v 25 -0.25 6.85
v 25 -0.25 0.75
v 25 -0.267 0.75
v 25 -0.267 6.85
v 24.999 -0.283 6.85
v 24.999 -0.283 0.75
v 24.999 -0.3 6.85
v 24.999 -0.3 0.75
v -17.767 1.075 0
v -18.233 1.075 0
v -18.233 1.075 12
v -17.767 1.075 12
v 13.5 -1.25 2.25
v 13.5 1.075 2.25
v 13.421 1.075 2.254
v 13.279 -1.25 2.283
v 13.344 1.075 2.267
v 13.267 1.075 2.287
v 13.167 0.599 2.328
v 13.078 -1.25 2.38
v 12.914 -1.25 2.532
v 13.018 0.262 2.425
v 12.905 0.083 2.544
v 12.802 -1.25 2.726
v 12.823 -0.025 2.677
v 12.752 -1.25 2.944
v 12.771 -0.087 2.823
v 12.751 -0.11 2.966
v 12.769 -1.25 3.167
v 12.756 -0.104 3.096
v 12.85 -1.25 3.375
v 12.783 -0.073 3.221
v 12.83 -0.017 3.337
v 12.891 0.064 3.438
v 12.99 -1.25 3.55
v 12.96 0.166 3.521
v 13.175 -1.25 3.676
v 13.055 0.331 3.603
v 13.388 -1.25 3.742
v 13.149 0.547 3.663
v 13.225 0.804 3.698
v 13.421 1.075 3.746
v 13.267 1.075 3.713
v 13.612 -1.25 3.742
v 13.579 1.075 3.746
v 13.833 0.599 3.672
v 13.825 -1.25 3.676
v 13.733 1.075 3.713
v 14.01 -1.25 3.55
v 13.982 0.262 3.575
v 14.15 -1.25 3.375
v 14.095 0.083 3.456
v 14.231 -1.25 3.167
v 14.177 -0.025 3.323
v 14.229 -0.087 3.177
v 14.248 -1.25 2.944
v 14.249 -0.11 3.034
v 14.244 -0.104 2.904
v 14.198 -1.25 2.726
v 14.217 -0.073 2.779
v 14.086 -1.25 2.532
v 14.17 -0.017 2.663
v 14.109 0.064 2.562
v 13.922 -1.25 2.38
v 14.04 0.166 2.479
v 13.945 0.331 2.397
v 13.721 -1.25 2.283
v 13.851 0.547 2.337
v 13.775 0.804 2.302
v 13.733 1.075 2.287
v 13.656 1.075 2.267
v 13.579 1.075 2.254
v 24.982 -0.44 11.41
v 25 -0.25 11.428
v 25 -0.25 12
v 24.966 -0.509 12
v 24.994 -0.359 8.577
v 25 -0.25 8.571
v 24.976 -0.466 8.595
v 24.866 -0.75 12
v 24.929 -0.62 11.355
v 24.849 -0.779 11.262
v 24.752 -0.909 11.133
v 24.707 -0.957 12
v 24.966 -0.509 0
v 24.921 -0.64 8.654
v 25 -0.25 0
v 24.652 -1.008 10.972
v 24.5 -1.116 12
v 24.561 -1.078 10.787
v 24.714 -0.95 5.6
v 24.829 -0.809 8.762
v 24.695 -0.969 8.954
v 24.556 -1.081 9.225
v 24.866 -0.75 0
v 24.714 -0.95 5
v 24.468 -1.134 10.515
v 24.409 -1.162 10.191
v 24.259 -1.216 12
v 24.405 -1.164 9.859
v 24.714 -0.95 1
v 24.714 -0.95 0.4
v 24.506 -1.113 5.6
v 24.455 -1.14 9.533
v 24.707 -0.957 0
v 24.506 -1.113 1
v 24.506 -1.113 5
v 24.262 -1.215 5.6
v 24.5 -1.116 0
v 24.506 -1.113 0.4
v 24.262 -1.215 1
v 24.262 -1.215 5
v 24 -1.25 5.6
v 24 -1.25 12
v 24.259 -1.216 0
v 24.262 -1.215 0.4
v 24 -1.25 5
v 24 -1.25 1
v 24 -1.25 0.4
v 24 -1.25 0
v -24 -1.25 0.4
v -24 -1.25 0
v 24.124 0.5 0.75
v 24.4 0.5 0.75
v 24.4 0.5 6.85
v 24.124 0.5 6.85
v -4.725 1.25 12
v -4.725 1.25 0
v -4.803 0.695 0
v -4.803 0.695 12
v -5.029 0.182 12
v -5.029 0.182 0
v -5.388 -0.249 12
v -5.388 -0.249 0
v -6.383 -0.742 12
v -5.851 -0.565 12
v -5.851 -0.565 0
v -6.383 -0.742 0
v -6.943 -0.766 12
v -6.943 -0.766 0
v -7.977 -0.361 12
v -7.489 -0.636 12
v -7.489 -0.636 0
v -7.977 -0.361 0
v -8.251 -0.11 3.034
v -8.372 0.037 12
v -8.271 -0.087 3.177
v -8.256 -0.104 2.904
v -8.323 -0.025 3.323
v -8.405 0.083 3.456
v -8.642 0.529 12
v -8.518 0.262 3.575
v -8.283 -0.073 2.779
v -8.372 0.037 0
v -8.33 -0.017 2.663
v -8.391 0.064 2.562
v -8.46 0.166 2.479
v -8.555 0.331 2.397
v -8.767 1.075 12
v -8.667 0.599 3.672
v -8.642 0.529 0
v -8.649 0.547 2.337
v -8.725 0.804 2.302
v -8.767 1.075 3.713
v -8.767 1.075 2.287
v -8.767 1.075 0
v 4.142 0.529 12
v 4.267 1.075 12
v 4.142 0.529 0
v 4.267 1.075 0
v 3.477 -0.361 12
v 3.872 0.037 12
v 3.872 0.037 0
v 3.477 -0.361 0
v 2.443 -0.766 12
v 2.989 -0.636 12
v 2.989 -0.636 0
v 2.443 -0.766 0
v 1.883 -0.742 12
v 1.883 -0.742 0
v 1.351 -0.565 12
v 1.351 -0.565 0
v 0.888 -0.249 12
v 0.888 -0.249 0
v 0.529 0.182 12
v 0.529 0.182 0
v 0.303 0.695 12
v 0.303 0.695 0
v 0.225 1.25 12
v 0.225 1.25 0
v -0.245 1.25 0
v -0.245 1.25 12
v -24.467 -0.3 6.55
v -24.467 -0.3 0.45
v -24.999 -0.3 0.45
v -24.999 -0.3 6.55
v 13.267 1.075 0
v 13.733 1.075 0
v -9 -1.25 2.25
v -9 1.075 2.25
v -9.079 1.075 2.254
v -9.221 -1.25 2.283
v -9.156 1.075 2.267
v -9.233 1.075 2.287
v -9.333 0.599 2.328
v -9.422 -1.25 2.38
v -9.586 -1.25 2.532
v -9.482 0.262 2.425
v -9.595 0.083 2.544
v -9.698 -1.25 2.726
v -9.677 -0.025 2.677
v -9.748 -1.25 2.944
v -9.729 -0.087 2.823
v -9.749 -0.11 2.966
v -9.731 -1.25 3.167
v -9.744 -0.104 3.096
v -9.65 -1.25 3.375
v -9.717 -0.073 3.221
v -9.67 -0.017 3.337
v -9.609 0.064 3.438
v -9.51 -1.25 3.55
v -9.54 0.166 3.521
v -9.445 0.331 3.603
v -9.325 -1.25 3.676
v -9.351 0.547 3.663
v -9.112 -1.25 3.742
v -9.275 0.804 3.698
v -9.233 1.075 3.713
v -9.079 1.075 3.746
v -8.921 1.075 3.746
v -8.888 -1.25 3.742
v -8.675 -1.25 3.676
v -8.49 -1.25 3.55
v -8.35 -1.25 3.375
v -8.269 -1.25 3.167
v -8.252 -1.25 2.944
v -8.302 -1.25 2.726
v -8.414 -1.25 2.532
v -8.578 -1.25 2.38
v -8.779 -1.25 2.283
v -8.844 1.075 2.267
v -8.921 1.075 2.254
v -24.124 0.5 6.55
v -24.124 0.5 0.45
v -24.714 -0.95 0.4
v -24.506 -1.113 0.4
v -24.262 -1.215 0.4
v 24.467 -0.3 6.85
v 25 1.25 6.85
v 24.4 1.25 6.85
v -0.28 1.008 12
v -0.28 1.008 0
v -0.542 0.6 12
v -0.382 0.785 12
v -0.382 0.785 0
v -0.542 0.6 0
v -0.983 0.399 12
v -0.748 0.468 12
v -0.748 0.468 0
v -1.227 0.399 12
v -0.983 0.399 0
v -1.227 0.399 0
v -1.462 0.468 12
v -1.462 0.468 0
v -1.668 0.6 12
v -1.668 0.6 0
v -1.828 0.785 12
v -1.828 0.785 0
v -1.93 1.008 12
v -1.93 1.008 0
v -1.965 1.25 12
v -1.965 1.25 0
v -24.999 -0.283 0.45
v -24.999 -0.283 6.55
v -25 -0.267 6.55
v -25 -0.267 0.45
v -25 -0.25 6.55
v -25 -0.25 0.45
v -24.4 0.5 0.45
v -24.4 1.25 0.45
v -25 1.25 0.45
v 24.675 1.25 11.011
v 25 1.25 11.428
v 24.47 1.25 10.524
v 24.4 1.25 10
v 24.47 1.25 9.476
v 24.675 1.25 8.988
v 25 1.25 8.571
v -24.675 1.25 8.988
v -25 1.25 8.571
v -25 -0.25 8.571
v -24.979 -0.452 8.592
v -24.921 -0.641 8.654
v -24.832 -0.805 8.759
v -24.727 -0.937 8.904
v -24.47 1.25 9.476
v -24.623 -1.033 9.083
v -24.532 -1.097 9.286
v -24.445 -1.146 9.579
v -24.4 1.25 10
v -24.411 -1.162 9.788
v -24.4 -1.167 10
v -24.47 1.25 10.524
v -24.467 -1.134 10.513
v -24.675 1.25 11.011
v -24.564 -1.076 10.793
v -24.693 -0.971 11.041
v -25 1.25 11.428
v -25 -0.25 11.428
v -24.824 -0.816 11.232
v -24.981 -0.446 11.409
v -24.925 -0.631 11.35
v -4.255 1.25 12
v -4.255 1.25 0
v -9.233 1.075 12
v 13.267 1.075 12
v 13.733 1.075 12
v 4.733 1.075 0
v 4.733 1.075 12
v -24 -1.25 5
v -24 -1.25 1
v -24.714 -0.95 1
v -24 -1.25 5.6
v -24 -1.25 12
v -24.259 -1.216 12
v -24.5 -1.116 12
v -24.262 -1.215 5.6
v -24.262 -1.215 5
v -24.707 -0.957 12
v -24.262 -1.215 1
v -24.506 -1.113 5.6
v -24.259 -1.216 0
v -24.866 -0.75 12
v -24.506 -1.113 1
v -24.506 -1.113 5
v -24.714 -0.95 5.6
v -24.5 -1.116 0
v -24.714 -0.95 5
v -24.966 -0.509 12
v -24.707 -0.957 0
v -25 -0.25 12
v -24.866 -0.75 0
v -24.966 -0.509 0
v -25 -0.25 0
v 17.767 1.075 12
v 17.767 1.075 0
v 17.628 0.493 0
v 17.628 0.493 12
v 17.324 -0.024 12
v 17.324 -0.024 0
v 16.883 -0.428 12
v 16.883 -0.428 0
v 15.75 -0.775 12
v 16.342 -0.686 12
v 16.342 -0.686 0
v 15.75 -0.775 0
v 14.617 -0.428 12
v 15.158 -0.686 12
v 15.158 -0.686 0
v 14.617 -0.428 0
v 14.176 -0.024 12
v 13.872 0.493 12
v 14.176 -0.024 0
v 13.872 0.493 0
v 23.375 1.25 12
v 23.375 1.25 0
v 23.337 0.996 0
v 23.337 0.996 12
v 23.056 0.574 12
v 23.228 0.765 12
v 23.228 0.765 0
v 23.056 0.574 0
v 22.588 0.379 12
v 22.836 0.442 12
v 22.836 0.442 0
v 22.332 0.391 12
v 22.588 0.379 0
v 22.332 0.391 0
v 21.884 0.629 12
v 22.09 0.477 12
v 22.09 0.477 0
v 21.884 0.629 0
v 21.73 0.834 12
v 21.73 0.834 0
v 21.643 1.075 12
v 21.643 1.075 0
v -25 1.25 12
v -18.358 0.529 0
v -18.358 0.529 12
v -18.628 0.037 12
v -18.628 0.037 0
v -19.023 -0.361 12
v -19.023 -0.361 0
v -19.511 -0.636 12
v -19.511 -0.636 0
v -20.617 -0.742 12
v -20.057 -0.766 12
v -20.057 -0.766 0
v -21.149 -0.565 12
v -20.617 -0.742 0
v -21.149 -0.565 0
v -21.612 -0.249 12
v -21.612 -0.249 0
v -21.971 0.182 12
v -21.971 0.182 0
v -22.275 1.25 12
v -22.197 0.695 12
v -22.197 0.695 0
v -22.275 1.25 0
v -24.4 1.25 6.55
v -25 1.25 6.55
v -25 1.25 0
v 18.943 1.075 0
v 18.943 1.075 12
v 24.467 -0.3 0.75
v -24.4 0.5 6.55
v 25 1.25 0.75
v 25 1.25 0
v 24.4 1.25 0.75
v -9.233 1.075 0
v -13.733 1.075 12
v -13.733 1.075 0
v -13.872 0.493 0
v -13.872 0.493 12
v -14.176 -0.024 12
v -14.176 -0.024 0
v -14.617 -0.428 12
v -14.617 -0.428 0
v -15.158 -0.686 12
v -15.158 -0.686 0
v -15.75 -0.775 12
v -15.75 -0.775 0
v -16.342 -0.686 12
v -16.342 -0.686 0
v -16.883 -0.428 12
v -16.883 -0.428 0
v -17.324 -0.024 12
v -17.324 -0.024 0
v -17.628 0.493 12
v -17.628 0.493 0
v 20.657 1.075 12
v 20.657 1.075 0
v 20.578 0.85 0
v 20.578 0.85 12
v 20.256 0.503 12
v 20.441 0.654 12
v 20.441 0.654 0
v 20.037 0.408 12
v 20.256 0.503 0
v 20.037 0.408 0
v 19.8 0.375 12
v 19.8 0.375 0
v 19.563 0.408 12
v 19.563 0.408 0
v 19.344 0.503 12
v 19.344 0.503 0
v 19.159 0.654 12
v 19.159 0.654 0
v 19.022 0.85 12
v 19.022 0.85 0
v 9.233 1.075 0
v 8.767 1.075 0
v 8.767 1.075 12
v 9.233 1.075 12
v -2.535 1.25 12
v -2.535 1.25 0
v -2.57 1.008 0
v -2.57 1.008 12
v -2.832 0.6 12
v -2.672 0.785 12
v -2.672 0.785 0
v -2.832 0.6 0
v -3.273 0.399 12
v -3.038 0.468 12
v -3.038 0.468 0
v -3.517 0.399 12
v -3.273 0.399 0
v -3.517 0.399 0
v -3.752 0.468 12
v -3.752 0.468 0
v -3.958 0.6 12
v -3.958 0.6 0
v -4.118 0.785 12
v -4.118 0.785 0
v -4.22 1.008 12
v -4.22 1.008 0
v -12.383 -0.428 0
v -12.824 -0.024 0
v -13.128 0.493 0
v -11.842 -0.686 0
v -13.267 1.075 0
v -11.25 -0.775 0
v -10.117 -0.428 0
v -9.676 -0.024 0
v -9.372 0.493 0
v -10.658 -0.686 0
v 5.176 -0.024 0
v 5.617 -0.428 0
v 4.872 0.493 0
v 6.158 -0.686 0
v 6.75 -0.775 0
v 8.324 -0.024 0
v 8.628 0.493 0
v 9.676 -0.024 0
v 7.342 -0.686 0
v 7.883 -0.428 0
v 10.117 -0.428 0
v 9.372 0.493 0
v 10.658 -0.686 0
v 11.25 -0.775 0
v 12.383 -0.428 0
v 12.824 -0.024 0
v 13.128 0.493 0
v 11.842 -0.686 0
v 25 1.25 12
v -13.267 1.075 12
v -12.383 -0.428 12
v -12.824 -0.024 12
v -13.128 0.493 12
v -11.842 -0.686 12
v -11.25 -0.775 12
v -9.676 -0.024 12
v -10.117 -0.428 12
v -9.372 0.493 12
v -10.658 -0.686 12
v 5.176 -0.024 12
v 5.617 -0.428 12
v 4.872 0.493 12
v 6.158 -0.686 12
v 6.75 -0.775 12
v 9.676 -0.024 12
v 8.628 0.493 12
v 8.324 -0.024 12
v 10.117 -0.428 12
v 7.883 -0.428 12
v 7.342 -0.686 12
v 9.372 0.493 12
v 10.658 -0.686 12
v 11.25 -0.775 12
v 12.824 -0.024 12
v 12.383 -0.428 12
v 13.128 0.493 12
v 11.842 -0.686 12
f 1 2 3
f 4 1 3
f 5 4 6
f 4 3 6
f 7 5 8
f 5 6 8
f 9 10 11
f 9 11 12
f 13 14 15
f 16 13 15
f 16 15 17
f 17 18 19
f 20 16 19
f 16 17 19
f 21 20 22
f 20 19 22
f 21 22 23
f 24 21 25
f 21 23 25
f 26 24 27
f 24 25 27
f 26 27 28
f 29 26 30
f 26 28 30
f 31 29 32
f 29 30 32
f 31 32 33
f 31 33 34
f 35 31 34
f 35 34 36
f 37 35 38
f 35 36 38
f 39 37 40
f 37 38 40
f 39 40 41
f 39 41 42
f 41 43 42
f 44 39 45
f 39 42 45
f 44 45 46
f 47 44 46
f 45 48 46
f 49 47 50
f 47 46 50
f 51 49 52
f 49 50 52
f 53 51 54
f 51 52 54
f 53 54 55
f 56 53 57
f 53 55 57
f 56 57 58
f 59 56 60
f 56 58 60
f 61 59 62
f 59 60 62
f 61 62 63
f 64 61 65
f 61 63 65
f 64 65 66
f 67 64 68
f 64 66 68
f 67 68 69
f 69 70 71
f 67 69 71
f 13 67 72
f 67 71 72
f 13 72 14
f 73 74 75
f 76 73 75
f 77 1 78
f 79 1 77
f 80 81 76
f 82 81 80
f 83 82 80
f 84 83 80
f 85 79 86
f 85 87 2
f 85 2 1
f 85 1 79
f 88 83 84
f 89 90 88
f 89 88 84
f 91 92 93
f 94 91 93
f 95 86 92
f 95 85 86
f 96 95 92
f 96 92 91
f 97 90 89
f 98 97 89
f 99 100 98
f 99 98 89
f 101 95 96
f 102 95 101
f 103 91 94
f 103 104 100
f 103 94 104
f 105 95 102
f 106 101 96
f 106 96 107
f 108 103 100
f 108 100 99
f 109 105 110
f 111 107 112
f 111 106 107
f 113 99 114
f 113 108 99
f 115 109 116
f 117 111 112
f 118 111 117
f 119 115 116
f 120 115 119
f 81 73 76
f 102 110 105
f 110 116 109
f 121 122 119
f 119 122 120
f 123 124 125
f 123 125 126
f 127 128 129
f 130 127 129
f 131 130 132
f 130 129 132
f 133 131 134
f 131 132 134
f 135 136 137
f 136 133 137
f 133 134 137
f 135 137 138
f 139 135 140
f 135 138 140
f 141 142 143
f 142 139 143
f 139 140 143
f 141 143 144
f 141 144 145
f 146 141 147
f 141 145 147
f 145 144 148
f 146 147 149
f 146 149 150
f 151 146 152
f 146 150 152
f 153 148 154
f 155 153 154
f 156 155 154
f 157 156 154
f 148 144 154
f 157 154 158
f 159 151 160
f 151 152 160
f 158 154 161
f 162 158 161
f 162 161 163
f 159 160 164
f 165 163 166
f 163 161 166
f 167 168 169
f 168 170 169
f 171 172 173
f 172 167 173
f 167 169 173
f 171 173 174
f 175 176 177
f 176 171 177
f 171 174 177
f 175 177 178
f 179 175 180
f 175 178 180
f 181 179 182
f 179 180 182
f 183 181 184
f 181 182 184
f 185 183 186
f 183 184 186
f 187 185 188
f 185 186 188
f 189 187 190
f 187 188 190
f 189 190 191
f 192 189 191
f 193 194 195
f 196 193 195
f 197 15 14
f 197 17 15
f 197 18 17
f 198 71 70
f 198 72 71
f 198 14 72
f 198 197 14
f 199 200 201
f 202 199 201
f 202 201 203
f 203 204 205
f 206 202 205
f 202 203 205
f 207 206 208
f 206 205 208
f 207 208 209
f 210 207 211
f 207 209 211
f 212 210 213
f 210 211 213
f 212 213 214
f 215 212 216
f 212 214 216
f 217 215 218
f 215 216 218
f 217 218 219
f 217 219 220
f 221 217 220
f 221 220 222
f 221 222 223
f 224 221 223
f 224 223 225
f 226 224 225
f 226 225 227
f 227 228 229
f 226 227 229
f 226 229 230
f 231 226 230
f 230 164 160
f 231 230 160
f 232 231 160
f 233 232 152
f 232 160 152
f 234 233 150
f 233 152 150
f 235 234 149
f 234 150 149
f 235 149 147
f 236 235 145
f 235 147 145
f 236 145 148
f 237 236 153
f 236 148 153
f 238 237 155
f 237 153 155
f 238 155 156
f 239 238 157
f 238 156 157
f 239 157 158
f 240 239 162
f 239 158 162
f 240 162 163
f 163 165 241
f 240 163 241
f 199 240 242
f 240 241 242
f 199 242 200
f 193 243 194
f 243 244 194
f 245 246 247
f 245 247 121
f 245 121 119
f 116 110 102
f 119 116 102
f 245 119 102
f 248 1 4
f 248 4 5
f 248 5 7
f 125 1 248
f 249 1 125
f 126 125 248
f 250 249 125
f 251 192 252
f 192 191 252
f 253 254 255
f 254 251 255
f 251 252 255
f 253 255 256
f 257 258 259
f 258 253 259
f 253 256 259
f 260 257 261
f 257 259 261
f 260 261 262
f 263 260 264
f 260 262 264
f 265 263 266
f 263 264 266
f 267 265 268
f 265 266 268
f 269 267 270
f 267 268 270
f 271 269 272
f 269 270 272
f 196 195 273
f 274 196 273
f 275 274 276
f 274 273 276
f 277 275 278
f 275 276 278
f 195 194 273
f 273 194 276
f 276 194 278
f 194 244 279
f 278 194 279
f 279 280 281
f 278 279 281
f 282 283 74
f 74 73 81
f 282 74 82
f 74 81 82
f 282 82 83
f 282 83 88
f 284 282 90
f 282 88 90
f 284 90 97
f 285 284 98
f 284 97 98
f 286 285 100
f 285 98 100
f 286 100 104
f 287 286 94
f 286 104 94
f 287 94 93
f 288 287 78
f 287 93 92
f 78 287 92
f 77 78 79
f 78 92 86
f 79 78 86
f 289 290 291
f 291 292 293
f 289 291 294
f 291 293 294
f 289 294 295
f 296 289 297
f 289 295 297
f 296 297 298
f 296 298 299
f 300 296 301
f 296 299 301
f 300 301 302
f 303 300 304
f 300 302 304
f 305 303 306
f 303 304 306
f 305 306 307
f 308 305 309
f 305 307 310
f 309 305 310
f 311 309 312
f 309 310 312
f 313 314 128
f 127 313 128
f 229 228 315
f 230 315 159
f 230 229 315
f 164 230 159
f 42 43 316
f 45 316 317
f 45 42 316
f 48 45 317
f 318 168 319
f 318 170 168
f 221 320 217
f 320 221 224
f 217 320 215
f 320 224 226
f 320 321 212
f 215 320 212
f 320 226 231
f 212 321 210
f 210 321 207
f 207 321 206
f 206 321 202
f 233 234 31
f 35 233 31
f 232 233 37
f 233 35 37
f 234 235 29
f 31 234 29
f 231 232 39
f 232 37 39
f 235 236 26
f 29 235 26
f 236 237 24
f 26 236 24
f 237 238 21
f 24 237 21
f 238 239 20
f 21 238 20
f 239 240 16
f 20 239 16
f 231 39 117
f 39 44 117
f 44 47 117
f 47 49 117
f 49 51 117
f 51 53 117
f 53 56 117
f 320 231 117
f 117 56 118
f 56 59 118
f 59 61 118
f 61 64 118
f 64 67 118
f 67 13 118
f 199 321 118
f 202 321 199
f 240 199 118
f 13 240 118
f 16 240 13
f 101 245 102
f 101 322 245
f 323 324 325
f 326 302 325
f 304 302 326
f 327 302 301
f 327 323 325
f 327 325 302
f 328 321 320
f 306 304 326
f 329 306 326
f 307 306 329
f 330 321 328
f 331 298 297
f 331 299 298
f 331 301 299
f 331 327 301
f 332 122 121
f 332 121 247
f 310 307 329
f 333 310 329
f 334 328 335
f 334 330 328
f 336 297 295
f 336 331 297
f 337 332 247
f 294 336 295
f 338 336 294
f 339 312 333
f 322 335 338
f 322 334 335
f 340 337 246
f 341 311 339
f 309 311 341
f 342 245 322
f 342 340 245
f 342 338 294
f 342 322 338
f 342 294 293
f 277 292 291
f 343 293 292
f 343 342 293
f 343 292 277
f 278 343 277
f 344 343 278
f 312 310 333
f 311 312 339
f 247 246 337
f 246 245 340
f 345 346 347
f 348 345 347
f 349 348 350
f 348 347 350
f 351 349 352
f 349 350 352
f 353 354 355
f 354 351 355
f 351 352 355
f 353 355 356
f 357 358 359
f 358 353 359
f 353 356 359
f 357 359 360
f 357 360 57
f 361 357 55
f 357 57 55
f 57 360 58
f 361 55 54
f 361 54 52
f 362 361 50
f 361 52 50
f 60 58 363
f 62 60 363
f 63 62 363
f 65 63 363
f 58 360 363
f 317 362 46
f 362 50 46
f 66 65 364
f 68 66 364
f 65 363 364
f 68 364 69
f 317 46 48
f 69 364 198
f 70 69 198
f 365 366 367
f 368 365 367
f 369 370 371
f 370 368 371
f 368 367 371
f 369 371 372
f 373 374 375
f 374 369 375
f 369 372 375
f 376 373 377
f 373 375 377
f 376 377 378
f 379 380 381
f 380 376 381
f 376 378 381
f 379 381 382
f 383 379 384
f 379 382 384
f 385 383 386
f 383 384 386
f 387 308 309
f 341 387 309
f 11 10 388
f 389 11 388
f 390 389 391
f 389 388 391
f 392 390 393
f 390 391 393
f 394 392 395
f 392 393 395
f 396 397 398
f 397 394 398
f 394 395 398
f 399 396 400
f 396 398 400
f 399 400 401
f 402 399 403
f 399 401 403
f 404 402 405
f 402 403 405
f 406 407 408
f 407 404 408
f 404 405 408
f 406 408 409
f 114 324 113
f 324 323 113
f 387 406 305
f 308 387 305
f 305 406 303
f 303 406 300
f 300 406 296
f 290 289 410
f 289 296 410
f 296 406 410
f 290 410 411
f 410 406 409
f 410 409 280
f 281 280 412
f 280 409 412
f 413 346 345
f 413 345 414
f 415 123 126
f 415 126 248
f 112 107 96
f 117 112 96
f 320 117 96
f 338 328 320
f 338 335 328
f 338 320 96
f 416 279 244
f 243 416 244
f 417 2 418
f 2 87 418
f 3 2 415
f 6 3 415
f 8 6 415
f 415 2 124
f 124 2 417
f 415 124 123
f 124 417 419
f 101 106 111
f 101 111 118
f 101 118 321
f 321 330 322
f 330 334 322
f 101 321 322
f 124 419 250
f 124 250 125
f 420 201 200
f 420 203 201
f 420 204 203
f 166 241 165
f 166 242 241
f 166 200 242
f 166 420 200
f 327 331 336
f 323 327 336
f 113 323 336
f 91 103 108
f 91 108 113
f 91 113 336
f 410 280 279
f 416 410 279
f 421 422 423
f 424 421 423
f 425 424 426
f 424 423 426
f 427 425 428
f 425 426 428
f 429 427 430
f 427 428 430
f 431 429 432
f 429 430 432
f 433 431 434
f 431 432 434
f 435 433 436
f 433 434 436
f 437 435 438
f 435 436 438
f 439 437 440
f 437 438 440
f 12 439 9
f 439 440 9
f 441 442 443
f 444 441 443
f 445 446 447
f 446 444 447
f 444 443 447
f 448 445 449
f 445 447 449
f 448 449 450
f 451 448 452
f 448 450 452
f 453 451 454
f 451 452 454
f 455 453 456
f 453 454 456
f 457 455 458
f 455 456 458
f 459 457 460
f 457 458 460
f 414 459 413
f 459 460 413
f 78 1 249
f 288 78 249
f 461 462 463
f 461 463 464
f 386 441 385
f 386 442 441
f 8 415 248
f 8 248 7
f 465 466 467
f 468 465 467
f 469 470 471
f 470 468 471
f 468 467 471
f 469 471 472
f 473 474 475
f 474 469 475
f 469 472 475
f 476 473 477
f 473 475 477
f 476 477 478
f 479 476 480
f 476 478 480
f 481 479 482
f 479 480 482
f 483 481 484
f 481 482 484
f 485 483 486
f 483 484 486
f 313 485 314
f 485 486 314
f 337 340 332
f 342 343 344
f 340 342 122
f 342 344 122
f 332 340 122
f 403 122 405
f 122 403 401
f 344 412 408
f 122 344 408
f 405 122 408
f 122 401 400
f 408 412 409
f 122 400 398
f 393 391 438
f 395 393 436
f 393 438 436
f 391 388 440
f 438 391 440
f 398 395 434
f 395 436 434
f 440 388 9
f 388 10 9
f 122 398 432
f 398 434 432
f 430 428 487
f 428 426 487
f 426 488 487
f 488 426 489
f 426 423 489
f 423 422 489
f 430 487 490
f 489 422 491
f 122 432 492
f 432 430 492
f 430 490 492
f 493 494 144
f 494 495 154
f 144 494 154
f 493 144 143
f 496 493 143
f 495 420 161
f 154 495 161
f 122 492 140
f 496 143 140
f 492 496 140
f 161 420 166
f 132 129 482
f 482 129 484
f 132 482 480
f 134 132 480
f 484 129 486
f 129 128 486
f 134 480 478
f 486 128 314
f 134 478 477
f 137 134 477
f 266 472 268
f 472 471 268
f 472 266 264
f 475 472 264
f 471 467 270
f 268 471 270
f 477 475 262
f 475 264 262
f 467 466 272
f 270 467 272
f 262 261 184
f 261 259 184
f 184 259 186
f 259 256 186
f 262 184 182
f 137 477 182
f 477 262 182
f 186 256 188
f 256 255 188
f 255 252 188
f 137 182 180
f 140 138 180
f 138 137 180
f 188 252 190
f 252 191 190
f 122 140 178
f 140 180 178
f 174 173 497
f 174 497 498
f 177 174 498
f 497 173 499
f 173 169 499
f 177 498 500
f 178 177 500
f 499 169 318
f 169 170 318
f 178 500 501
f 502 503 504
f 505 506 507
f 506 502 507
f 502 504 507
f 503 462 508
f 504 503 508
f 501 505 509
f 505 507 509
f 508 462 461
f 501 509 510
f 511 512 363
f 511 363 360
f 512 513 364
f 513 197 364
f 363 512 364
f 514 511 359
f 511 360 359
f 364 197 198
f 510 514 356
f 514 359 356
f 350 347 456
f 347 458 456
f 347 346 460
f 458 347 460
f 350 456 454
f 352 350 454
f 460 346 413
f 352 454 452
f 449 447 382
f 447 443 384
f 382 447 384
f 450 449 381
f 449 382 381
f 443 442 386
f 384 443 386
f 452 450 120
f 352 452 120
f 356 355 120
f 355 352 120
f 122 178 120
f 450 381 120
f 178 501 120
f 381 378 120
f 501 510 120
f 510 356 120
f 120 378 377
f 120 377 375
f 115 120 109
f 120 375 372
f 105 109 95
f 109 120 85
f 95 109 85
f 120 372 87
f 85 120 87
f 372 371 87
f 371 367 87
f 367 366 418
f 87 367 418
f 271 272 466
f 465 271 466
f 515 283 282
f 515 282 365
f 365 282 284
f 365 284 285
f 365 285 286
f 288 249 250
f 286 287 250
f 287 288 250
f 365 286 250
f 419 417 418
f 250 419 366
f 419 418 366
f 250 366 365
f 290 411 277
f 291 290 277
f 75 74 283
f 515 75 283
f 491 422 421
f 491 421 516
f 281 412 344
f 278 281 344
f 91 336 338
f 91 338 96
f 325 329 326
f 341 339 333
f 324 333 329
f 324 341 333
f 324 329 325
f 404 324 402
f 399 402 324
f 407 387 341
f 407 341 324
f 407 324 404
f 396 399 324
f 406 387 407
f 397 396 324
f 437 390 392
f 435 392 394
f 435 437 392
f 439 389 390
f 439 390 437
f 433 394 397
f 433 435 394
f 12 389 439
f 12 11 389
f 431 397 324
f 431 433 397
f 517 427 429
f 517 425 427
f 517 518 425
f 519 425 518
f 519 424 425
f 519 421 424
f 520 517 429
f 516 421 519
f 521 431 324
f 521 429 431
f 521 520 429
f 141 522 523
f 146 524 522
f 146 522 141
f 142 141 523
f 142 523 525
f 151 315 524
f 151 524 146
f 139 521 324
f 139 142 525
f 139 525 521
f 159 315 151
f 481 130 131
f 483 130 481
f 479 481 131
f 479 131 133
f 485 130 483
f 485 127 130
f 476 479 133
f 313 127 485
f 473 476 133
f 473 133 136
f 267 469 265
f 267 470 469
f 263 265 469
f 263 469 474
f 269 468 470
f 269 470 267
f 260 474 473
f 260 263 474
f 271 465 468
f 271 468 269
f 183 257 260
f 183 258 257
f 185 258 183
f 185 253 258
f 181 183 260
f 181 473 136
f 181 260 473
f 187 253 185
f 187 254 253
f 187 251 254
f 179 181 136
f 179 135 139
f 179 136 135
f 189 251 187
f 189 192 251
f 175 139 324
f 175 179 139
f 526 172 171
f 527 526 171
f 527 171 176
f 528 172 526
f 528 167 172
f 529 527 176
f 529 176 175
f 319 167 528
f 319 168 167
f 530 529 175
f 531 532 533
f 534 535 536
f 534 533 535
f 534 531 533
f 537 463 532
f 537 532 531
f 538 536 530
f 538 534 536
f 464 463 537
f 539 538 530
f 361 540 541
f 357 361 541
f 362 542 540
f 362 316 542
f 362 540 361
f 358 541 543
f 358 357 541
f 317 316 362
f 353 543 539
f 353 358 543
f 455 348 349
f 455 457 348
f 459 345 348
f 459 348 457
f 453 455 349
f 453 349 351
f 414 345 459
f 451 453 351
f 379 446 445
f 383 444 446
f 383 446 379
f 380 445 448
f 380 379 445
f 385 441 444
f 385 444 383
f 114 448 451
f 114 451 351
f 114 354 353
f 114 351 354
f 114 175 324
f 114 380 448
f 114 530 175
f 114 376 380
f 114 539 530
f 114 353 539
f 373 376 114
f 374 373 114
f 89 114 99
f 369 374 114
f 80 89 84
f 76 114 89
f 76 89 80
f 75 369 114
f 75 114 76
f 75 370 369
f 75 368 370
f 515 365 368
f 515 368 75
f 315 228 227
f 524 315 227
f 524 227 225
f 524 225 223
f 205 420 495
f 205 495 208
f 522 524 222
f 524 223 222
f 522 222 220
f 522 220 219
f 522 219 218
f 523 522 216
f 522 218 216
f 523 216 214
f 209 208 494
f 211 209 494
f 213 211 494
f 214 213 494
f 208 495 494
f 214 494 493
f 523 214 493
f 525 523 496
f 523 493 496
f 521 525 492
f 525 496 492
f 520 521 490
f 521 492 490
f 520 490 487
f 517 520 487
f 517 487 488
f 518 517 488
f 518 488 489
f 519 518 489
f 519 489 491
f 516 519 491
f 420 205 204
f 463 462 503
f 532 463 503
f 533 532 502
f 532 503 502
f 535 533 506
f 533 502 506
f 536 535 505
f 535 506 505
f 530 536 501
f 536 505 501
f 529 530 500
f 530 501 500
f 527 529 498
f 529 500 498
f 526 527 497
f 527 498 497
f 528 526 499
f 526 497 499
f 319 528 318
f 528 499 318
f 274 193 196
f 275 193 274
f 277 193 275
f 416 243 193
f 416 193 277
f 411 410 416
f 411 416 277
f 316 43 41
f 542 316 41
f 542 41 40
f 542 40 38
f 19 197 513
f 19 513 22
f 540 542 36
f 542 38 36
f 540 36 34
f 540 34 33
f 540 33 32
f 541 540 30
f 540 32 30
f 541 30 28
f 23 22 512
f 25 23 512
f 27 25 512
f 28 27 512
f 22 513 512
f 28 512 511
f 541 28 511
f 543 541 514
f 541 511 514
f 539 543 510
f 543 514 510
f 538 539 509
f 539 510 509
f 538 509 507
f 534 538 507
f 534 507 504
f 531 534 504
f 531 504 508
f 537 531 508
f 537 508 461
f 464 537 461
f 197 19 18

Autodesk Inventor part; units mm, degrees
sketch "Sketch1" plane through (0, 0, 0) normal (0, 0, 1) x (1, 0, 0)
  line L0 (-25, 1.25) -> (-25, -0.25)
  line L1 (-24, -1.25) -> (24, -1.25)
  line L2 (25, -0.25) -> (25, 1.25)
  line L3 (25, 1.25) -> (-25, 1.25)
  line L4 (0, 0) -> (0, 5.9906) construction
  line L5 (0, 0) -> (2.2727, 0) construction
  arc A0 (-17.775, 1.25) -> (-13.725, 1.25) centre (-15.75, 1.25) ccw
  arc A1 (-13.275, 1.25) -> (-9.225, 1.25) centre (-11.25, 1.25) ccw
  arc A2 (-8.775, 1.25) -> (-4.725, 1.25) centre (-6.75, 1.25) ccw
  arc A3 (-4.255, 1.25) -> (-2.535, 1.25) centre (-3.395, 1.25) ccw
  arc A4 (-1.965, 1.25) -> (-0.245, 1.25) centre (-1.105, 1.25) ccw
  arc A5 (0.225, 1.25) -> (4.275, 1.25) centre (2.25, 1.25) ccw
  arc A6 (4.725, 1.25) -> (8.775, 1.25) centre (6.75, 1.25) ccw
  arc A7 (9.225, 1.25) -> (13.275, 1.25) centre (11.25, 1.25) ccw
  arc A8 (13.725, 1.25) -> (17.775, 1.25) centre (15.75, 1.25) ccw
  arc A9 (18.925, 1.25) -> (20.675, 1.25) centre (19.8, 1.25) ccw
  arc A10 (21.625, 1.25) -> (23.375, 1.25) centre (22.5, 1.25) ccw
  arc A11 (-25, -0.25) -> (-24, -1.25) centre (-24, -0.25) ccw
  arc A12 (24, -1.25) -> (25, -0.25) centre (24, -0.25) ccw
  arc A13 (-22.275, 1.25) -> (-18.225, 1.25) centre (-20.25, 1.25) ccw
  point P0 (-25, -1.25)
  point P1 (25, -1.25)
  dimension "d0" = 2.5
  dimension "d1" = 50
  dimension "d2" = 90
  dimension "d4" = 4.05
  dimension "d5" = 4.05
  dimension "d6" = 4.05
  dimension "d7" = 1.72
  dimension "d8" = 1.72
  dimension "d9" = 4.05
  dimension "d10" = 4.05
  dimension "d11" = 4.05
  dimension "d12" = 4.05
  dimension "d13" = 1.75
  dimension "d14" = 1.75
  dimension "d16" = 4.5
  dimension "d17" = 4.5
  dimension "d18" = 3.355
  dimension "d19" = 2.29
  dimension "d20" = 3.355
  dimension "d21" = 4.5
  dimension "d22" = 4.5
  dimension "d23" = 4.5
  dimension "d25" = 2.7
  dimension "d26" = 1
  dimension "d51" = 2.5
  dimension "d52" = 4.05
  dimension "d53" = 4.5
  dimension "d101" = 4.05
extrude "Extrusion1" add sketch "Sketch1" along normal blind 12 contours L3 A13 A0 A1 A2 A3 A4 A5 A6 A7 A8 A9 A10 L2 A12 L1 A11 L0
sketch "Sketch2" plane through (-24, -1.25, 0) normal (0, -1, 0) x (1, 0, 0)
  line L0 (49, 0) -> (49, 12) projected
  line L1 (-1, 0) -> (-1, 12) projected
  line L2 (0, 0) -> (48, 0) projected
  line L3 (-0.714, 0.4) -> (48.714, 0.4)
  line L4 (48.714, 1) -> (-0.714, 1)
  line L5 (48.714, 5) -> (-0.714, 5)
  line L6 (-0.714, 5) -> (-0.714, 5.6)
  line L7 (-0.714, 5.6) -> (48.714, 5.6)
  line L8 (48.714, 5.6) -> (48.714, 5)
  line L9 (-0.714, 1) -> (-0.714, 0.4)
  line L10 (48.714, 1) -> (48.714, 0.4)
  point P0 (24, 0)
  point P1 (37.5, 3)
  point P2 (15, 3)
  point P3 (48.714, 5.3)
  dimension "d29" = 11.5
  dimension "d30" = 22.5
  dimension "d32" = 3
  dimension "d33" = 0.6
  dimension "d34" = 0.6
  dimension "d35" = 0.4
  dimension "d36" = 4
  dimension "d48" = 0.286
  dimension "d49" = 0.6
  dimension "d50" = 0.286
hole "Hole1" at (13.5, -1.25, 3) at (-9, -1.25, 3) direction (0, 1, 0) diameter 1.5 end through all
extrude "Extrusion3" cut sketch "Sketch2" against normal blind 0.3
sketch "Sketch3" plane through (0, 0, 0) normal (0, 0, -1) x (-1, 0, 0)
  line L0 (-23, 1.25) -> (-1.5933, 1.25)
  line L1 (-1.5933, 1.25) -> (-1.5933, 1.075)
  line L2 (-1.5933, 1.075) -> (-23, 1.075)
  line L3 (-23, 1.075) -> (-23, 1.25)
  line L4 (7.4905, 1.25) -> (21.4905, 1.25)
  line L5 (21.4905, 1.25) -> (21.4905, 1.075)
  line L6 (21.4905, 1.075) -> (7.4905, 1.075)
  line L7 (7.4905, 1.075) -> (7.4905, 1.25)
  line L8 (8.775, 1.25) -> (9.225, 1.25) projected
  line L9 (-25, -0.25) -> (-25, 1.25) projected
  line L10 (25, 1.25) -> (25, -0.25) projected
  point P0 (0, 0)
  point P1 (9, 1.25)
  dimension "d54" = 0.175
  dimension "d55" = 0.175
  dimension "d56" = 14
  dimension "d57" = 21.4067
  dimension "d58" = 2
  dimension "d59" = 3.5095
extrude "Extrusion4" cut sketch "Sketch3" against normal blind 25.3
ref_plane "Work Plane1" through (0, 0, 1.25) normal (0, 0, -1) x (-1, 0, 0)
sketch "Sketch5" plane through (-24, -1.25, 12) normal (0, -1, 0) x (1, 0, 0)
  circle A0 centre (-2.4, -2.0003) radius 2
  circle A1 centre (50.4, -2.0003) radius 2
  line L0 (-1, -12) -> (-1, 0) projected
  line L1 (-1, 0) -> (-1, -0.572)
  line L2 (49, -12) -> (49, 0) projected
  line L3 (49, 0) -> (49, -0.572)
  point P0 (24, -12)
  dimension "d71" = 4
  dimension "d72" = 4
  dimension "d73" = 0.572
  dimension "d74" = 0.572
  dimension "d75" = 1.4
  dimension "d76" = 1.4
extrude "Extrusion6" cut sketch "Sketch5" against normal blind 4
ref_plane "Work Plane2" through (0, 0, 0.75) normal (0, 0, -1) x (-1, 0, 0)
sketch "Sketch6" plane through (0, 0, 0.75) normal (0, 0, -1) x (-1, 0, 0)
  line L0 (-25, 1.25) -> (-23.375, 1.25) projected
  line L1 (-25, 1.25) -> (-24.4, 1.25)
  line L2 (-24.4, 1.25) -> (-24.4, 0.5)
  line L3 (-24.4, 0.5) -> (-24.124, 0.5)
  line L4 (-24.124, 0.5) -> (-24.4667, -0.2996)
  line L5 (-24.124, 0.5) -> (-23.254, 0.5) construction
  line L6 (-24.4667, -0.2996) -> (-24.9987, -0.2996)
  line L7 (-24.4667, -0.2996) -> (-24.4, -0.2996) construction
  line L8 (-25, 1.25) -> (-25, -0.25) projected
  line L9 (-25, -0.25) -> (-25, 1.25) projected
  line L10 (-25, 1.25) -> (-25, -0.25)
  line L11 (-24.4, -0.2996) -> (-24.365, -0.2996)
  arc A0 (-24.714, -0.9501) -> (-24, -1.25) centre (-24, -0.25) ccw projected
  arc A1 (-25, -0.25) -> (-24.9987, -0.2996) centre (-24.0293, -0.25) ccw
  point P0 (0, 0)
  dimension "d80" = 0.6
  dimension "d81" = 0.75
  dimension "d82" = 0.276
  dimension "d83" = 113.2
  dimension "d84" = 0.87
  dimension "d86" = 0.532
  dimension "d87" = 180
extrude "Extrusion7" cut sketch "Sketch6" against normal blind 6.1
ref_plane "Work Plane3" through (0, 0, 0.45) normal (0, 0, -1) x (-1, 0, 0)
sketch "Sketch7" plane through (0, 0, 0.45) normal (0, 0, -1) x (-1, 0, 0)
  line L0 (-25, 1.25) -> (-24.25, 1.25)
  line L1 (-25, 1.25) -> (-24.4, 1.25)
  line L2 (-24.4, 1.25) -> (-24.4, 0.5)
  line L3 (-24.4, 0.5) -> (-24.124, 0.5)
  line L4 (-24.124, 0.5) -> (-24.4667, -0.2996)
  line L5 (-24.124, 0.5) -> (-23.254, 0.5) construction
  line L6 (-24.4667, -0.2996) -> (-24.9987, -0.2996)
  line L7 (-24.4667, -0.2996) -> (-24.4, -0.2996) construction
  line L8 (-25, 1.25) -> (-25, -0.25)
  line L9 (-25, -0.25) -> (-25, 1.25)
  line L10 (-25, 1.25) -> (-25, -0.25)
  line L11 (-24.4, -0.2996) -> (-24.365, -0.2996)
  arc A0 (-24.714, -0.9501) -> (-24, -1.25) centre (-24, -0.25) ccw
  arc A1 (-25, -0.25) -> (-24.9987, -0.2996) centre (-24.0293, -0.25) ccw
  line L12 (0, 0) -> (0, -6.4481) construction
  line L13 (25, 1.25) -> (24.25, 1.25)
  line L14 (24.4, 1.25) -> (24.4, 0.5)
  line L15 (24.4, 0.5) -> (24.124, 0.5)
  line L16 (24.124, 0.5) -> (23.254, 0.5) construction
  line L17 (24.4, -0.2996) -> (24.365, -0.2996)
  line L18 (24.4667, -0.2996) -> (24.4, -0.2996) construction
  line L19 (24.124, 0.5) -> (24.4667, -0.2996)
  line L20 (24.4667, -0.2996) -> (24.9987, -0.2996)
  arc A2 (24.9987, -0.2996) -> (25, -0.25) centre (24.0293, -0.25) ccw
  line L21 (25, 1.25) -> (25, -0.25)
  line L22 (25, 1.25) -> (25, -0.25)
  line L23 (25, -0.25) -> (25, 1.25)
  line L24 (25, 1.25) -> (24.4, 1.25)
  point P0 (24, -0.25)
  point P1 (24, -0.25)
  dimension "d92" = 0.6
  dimension "d93" = 0.75
  dimension "d94" = 0.276
  dimension "d95" = 113.2
  dimension "d96" = 0.87
  dimension "d97" = 0.532
  dimension "d98" = 180
extrude "Extrusion8" cut sketch "Sketch7" against normal blind 6.1 contours L21 A2 L20 L19 L15 L14 L13
properties part number "3d_LM - Pinza 4" material "PA12 SLS 3D Print"
